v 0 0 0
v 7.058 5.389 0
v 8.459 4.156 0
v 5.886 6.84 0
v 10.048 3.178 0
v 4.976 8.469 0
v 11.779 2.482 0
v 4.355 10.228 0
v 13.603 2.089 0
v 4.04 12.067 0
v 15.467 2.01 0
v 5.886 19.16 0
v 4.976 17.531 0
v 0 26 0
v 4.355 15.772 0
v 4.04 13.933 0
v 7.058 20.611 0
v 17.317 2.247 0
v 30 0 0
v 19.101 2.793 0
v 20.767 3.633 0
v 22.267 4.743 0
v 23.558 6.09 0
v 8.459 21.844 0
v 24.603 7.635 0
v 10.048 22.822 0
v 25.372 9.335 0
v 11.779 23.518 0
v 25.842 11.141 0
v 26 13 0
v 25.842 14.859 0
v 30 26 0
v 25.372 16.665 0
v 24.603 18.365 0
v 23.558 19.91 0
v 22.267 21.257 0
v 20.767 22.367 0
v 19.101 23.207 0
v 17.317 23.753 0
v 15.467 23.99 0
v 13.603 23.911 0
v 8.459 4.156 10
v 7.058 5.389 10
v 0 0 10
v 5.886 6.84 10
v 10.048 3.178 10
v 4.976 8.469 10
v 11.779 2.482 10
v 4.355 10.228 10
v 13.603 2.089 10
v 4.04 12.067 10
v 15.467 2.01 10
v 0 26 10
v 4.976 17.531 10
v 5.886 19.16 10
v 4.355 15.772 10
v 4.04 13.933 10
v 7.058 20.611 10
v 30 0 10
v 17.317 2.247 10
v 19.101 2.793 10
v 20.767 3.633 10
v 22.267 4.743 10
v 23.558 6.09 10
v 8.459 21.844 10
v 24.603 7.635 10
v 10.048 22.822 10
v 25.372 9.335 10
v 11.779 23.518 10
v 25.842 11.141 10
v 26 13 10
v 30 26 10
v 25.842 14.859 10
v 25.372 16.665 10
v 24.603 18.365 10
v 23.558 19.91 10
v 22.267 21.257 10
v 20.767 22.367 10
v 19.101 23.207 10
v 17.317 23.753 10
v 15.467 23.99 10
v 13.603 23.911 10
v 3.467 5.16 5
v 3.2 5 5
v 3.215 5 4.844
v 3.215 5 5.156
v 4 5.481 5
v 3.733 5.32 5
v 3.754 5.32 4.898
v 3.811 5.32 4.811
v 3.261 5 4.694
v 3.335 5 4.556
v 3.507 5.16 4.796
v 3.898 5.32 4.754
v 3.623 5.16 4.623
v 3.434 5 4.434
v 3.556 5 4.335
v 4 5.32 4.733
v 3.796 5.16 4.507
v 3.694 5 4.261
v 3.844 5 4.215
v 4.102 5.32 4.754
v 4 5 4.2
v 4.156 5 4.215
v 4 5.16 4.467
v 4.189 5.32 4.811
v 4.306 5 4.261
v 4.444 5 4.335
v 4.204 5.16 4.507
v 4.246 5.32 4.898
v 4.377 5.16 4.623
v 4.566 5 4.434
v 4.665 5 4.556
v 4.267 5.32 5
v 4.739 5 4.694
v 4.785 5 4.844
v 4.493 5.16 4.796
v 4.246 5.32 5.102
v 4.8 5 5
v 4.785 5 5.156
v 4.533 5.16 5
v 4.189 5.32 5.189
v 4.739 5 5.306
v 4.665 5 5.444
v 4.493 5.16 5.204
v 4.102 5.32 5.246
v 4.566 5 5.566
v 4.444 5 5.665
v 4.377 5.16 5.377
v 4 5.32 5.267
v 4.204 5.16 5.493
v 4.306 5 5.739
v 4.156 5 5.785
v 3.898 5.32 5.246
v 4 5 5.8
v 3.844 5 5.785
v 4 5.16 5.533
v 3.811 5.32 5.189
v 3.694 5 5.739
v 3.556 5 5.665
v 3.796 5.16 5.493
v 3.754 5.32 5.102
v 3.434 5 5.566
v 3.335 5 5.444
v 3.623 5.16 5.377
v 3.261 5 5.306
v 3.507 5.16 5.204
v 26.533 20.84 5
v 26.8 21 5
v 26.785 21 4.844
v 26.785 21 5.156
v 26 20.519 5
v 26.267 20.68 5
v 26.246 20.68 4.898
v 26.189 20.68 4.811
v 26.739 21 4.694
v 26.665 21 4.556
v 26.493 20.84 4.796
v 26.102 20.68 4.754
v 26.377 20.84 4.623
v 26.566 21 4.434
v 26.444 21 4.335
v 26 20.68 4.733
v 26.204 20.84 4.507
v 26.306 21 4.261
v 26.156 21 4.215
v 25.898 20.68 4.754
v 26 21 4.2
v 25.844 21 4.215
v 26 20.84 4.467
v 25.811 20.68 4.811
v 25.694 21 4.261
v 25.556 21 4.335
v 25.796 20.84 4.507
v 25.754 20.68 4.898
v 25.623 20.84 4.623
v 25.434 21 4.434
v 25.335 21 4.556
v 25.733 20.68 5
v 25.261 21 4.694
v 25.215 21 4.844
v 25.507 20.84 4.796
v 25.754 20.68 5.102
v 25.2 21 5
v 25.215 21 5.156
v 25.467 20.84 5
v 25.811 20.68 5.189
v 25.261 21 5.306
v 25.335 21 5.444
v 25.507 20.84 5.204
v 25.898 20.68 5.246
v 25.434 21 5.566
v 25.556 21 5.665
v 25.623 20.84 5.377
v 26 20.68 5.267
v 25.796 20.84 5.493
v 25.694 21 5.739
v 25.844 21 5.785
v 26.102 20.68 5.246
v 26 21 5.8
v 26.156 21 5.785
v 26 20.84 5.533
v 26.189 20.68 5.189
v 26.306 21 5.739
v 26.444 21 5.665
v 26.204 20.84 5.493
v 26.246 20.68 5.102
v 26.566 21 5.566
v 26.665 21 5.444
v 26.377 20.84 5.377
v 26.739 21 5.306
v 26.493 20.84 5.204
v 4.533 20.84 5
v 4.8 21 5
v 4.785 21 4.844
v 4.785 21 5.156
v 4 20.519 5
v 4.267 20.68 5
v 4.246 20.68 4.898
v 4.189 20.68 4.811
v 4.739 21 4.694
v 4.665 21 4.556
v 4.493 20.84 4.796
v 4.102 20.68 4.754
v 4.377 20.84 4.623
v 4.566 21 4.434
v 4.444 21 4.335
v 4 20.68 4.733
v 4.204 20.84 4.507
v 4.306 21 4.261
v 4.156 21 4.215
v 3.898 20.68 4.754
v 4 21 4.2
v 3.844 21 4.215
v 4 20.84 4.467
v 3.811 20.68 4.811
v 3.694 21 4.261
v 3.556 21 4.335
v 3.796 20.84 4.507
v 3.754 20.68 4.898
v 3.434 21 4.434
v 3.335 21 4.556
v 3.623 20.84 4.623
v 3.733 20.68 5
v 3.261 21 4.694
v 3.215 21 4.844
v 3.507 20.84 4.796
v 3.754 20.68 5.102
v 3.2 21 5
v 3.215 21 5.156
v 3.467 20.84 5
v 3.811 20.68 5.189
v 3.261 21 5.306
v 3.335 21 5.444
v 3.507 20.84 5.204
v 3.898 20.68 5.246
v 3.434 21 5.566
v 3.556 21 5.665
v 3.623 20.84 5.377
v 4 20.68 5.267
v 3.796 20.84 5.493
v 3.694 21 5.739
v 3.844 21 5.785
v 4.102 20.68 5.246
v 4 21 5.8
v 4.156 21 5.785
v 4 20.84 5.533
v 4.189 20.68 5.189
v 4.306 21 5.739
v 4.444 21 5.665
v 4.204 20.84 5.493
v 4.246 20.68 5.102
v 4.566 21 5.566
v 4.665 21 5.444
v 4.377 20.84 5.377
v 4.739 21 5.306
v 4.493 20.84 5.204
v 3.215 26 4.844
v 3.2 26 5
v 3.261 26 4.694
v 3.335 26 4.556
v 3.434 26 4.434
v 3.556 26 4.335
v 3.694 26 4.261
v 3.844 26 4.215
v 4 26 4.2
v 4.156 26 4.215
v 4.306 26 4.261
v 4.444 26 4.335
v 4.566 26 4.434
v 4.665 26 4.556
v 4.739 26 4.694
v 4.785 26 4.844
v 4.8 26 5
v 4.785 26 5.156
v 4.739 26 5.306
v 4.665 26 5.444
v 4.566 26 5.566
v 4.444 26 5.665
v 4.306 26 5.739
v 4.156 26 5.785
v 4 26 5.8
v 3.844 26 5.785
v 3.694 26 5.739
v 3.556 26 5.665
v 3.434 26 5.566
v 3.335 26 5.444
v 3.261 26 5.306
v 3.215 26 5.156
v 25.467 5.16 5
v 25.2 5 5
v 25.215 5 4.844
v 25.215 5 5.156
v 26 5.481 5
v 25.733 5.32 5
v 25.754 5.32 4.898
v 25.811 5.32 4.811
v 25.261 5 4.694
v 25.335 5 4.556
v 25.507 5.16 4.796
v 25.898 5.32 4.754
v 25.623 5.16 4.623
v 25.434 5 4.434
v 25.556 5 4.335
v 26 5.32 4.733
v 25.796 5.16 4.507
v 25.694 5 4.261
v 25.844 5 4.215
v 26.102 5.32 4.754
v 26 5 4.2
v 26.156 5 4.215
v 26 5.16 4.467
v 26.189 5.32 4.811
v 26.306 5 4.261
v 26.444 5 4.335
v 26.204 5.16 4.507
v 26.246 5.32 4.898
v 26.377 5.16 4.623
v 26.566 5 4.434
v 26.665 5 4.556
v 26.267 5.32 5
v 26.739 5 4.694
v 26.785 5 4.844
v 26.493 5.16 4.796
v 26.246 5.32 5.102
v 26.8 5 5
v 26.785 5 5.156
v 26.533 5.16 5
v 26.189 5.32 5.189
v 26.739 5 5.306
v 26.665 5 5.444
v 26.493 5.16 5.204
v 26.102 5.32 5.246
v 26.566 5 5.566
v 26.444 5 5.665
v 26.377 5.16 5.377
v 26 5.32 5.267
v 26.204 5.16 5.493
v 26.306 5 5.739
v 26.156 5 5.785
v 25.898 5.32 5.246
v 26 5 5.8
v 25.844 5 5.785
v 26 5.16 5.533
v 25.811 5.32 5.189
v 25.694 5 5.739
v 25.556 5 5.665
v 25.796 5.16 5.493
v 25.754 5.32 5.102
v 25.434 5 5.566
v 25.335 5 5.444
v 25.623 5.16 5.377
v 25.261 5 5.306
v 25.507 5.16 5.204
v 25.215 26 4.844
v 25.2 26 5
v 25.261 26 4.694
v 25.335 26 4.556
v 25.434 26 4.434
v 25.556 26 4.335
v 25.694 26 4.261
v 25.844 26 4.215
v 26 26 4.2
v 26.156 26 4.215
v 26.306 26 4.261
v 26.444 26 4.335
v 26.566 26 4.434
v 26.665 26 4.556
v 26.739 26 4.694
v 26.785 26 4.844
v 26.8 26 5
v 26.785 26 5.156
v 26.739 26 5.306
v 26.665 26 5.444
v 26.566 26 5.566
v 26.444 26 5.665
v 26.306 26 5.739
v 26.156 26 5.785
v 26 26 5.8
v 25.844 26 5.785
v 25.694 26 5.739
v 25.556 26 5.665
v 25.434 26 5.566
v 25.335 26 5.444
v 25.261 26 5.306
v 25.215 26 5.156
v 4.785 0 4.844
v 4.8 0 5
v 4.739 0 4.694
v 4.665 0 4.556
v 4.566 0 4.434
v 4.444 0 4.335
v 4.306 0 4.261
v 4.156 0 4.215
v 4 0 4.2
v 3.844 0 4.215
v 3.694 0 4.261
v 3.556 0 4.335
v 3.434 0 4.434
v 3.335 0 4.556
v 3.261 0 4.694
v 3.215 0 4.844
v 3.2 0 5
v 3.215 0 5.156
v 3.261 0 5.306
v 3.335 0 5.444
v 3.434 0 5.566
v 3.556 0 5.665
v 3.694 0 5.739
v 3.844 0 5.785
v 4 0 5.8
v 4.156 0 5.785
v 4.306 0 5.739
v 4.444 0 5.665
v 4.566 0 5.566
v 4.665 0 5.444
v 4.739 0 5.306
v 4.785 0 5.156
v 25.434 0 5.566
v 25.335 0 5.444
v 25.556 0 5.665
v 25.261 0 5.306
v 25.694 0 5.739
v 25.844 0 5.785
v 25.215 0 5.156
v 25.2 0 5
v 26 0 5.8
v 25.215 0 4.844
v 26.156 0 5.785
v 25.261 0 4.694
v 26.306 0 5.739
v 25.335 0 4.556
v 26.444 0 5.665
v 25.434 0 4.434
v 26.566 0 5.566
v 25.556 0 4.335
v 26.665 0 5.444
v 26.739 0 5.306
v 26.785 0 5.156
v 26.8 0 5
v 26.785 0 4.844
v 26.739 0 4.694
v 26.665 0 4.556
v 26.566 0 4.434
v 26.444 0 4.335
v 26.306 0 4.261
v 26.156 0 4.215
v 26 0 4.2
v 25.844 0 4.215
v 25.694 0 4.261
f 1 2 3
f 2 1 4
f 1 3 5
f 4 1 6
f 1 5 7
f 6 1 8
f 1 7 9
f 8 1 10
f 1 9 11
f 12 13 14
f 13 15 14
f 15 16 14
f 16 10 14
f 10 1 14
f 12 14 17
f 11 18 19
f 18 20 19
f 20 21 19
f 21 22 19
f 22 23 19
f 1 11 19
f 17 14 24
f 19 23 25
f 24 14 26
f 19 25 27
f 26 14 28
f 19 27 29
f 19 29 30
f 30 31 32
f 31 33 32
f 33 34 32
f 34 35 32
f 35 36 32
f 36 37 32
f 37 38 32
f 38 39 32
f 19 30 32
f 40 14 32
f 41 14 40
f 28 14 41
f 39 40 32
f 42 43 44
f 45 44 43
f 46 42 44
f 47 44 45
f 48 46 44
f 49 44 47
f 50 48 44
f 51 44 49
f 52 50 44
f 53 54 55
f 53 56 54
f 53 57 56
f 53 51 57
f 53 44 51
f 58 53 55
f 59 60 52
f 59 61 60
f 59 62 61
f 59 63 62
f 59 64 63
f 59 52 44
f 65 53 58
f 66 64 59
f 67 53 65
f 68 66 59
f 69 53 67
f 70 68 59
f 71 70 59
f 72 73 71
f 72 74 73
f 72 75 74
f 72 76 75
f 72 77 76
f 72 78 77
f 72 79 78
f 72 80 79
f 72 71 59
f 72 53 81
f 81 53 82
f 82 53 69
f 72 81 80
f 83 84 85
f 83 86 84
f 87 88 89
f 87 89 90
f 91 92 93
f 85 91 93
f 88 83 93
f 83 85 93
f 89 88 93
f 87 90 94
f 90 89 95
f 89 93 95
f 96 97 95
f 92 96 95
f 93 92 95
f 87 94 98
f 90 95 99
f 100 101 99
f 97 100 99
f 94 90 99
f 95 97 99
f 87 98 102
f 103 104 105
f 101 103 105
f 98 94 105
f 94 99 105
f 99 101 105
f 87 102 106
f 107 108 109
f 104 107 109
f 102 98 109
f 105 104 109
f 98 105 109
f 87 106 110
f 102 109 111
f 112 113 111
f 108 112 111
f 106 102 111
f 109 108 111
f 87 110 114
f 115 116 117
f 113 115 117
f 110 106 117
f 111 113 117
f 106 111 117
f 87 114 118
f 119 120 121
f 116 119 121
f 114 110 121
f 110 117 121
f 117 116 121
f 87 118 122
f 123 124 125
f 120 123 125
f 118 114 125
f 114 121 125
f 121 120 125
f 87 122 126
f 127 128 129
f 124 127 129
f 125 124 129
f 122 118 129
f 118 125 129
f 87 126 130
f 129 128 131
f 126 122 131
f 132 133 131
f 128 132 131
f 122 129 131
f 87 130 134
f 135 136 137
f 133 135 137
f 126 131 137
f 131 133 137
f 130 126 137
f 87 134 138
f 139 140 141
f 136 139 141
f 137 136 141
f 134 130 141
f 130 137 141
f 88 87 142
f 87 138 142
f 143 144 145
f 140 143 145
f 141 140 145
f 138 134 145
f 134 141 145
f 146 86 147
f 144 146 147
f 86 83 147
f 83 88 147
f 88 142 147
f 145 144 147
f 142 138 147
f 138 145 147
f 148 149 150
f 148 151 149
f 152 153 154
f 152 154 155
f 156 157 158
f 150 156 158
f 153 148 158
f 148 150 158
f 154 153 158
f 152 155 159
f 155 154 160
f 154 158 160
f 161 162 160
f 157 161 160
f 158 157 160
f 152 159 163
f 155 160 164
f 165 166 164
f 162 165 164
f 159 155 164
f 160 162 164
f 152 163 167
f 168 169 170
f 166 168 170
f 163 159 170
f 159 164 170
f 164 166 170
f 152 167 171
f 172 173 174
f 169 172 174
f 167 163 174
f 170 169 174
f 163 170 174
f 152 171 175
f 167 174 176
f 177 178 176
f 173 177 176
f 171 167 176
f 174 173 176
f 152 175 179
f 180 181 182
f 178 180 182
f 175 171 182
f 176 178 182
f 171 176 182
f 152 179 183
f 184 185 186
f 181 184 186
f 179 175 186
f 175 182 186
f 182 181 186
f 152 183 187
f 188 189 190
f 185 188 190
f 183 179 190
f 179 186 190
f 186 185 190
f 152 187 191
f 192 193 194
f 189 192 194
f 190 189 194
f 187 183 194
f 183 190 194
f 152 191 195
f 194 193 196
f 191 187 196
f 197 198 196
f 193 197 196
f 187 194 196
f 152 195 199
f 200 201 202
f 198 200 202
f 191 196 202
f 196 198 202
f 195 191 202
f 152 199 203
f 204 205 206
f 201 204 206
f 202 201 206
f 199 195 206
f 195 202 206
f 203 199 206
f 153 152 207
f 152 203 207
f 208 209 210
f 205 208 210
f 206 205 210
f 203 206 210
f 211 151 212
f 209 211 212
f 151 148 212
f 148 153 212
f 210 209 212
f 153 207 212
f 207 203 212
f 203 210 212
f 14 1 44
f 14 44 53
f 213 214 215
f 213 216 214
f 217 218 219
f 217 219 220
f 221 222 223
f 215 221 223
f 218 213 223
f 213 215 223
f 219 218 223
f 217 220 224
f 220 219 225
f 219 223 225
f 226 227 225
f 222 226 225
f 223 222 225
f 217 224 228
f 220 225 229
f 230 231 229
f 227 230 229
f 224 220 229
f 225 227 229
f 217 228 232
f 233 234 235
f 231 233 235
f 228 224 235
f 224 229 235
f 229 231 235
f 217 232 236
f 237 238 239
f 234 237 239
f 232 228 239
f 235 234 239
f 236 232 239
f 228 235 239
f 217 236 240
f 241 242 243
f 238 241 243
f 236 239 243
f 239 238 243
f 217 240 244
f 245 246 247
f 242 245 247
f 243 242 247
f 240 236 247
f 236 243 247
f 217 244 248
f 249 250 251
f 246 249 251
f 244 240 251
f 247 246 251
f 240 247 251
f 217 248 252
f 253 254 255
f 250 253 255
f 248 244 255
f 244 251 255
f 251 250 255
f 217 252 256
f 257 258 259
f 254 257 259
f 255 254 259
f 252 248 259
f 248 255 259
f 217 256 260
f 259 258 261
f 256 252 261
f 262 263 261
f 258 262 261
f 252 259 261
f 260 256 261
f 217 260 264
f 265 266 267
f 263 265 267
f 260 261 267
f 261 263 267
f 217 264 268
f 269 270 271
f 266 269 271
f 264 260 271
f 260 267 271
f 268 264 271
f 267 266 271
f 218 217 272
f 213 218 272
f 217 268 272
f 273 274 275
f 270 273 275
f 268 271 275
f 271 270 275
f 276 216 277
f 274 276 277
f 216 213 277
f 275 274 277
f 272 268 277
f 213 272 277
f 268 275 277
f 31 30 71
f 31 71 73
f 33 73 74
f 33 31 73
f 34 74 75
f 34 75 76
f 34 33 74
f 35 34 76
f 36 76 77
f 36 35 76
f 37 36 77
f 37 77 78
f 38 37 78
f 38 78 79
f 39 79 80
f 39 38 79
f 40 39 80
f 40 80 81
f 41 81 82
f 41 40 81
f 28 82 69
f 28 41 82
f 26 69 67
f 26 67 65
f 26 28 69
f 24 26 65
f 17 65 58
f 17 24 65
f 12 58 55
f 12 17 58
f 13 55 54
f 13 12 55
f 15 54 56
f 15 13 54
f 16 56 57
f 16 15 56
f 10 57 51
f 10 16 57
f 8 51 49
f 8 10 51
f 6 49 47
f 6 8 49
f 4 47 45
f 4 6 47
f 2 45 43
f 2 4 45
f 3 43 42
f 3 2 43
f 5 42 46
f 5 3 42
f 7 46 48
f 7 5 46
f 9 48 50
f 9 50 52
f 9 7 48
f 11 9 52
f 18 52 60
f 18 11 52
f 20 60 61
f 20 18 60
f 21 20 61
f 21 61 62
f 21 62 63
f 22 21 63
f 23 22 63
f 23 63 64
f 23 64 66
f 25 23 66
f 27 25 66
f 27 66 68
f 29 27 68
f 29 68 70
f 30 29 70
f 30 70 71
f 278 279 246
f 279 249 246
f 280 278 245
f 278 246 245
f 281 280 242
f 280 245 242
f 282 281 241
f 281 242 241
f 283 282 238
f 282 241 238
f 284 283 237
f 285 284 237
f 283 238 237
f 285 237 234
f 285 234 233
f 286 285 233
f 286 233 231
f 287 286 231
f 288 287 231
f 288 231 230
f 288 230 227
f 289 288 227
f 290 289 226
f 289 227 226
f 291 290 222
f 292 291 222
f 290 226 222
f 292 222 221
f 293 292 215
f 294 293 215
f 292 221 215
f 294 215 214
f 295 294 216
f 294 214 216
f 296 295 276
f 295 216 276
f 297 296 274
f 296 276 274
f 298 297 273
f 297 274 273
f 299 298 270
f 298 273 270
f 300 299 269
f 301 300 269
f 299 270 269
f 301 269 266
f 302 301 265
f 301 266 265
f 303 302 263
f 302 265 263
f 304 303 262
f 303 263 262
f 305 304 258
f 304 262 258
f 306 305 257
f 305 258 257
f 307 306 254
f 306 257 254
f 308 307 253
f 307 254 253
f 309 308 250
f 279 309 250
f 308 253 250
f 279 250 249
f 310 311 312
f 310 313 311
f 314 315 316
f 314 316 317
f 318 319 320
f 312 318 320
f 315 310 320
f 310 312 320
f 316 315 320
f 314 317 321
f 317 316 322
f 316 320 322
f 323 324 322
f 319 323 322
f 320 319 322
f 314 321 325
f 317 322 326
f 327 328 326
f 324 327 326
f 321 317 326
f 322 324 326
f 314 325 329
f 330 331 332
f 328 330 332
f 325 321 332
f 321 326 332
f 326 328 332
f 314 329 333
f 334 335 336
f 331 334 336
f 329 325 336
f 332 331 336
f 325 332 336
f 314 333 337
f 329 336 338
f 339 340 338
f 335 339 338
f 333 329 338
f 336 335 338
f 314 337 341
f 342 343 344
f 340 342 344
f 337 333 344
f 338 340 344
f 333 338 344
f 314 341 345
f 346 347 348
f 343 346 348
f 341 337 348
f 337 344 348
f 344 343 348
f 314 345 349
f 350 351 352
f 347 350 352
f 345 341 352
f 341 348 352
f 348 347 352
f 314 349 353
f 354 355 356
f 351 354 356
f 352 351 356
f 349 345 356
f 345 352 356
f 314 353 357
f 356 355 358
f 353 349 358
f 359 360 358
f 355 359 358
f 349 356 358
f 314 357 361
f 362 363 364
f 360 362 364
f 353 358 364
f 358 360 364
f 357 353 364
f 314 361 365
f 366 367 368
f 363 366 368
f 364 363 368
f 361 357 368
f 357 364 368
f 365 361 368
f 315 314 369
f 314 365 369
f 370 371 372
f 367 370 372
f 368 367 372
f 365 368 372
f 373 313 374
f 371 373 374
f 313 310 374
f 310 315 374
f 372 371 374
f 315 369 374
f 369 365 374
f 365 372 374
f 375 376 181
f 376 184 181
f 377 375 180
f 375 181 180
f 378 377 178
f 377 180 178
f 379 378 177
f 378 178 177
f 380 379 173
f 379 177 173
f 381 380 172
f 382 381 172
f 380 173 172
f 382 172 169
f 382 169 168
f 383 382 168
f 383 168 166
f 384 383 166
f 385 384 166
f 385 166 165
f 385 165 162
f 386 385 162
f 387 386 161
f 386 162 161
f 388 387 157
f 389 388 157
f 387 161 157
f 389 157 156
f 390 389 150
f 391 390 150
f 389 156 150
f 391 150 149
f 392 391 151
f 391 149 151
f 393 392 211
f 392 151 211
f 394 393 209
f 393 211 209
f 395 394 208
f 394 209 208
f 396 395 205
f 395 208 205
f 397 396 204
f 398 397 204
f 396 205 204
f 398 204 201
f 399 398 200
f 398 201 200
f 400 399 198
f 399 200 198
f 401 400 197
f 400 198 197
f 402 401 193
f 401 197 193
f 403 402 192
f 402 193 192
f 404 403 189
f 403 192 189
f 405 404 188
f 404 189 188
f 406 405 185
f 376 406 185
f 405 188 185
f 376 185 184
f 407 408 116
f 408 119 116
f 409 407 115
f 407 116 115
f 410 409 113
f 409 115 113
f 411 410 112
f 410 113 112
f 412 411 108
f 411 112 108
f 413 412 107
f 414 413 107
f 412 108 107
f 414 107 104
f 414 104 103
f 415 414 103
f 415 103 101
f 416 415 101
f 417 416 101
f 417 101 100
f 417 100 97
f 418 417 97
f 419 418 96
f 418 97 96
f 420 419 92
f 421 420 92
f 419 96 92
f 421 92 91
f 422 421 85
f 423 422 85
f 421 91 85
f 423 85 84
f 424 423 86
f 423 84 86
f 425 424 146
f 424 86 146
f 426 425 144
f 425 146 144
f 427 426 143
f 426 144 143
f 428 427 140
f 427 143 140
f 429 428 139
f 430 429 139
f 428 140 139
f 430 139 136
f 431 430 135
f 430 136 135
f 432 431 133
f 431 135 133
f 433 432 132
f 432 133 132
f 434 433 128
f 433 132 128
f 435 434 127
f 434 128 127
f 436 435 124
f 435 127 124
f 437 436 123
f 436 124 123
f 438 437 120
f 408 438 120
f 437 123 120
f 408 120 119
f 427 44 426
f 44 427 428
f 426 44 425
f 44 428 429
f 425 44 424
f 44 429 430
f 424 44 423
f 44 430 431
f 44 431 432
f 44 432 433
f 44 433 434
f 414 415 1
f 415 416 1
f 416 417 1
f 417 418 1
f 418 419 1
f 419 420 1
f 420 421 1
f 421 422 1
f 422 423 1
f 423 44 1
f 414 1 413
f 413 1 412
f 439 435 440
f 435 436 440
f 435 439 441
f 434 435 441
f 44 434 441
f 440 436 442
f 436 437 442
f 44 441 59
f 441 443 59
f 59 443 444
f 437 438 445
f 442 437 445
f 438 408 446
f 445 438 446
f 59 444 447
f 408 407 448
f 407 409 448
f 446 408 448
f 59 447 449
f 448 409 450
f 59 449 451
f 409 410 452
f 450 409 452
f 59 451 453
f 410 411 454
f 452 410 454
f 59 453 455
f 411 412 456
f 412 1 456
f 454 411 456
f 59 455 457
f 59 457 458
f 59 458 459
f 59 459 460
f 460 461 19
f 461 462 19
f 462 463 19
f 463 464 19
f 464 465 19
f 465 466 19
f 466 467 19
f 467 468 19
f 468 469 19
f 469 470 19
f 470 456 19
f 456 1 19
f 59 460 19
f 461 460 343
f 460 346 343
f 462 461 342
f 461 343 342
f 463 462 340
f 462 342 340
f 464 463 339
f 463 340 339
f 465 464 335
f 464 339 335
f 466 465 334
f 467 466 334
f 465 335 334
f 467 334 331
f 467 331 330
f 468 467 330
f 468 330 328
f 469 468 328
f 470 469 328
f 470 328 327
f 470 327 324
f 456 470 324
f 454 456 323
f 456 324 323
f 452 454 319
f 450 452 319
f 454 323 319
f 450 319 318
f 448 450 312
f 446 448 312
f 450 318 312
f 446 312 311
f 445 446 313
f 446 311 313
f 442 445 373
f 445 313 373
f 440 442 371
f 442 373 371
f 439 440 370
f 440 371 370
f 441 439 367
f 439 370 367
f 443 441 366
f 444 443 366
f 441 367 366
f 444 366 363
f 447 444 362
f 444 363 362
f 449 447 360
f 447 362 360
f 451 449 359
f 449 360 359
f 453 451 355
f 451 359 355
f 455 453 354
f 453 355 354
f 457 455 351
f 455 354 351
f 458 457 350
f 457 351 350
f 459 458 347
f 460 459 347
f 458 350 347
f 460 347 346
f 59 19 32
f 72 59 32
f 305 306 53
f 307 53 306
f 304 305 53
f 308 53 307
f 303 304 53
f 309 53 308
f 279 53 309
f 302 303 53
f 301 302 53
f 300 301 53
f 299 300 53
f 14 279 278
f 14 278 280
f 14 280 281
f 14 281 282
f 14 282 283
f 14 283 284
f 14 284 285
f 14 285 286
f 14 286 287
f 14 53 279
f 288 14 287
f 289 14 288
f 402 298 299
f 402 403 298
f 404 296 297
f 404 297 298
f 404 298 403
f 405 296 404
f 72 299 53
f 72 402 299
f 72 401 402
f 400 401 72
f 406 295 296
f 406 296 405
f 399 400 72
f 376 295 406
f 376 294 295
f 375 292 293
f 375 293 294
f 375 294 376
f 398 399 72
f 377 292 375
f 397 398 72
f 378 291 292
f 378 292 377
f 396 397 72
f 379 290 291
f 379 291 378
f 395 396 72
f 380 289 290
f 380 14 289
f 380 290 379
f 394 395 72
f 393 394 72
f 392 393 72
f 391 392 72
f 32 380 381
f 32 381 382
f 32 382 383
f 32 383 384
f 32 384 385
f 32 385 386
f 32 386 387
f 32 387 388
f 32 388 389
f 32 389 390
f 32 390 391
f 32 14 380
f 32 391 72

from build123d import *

# Parameters (mm, degrees)
ESQUISSE1_W                                   = 30
ESQUISSE1_H                                   = 26
ESQUISSE1_R                                   = 11
BOSS_EXTRU_1_DEPTH                            = 10
TROU_POUR_TARAUDAGE_POUR_TROU_TARAUD_M2_D     = 1.6
TROU_POUR_TARAUDAGE_POUR_TROU_TARAUD_M2_DEPTH = 5
TROU_POUR_TARAUDAGE_POUR_TROU_TARAUD_M2_TIP   = 0.480688495
TROU_POUR_TARAUDAGE_POUR_TROU_TARAUD_2_D      = 1.6
TROU_POUR_TARAUDAGE_POUR_TROU_TARAUD_2_DEPTH  = 5
TROU_POUR_TARAUDAGE_POUR_TROU_TARAUD_2_TIP    = 0.480688495


with BuildPart() as part:
    # Esquisse1 → Boss.-Extru.1 (new body)
    with BuildSketch(Plane.XY):
        with Locations((15, 13)):
            Rectangle(ESQUISSE1_W, ESQUISSE1_H)
        with Locations((15, 13)):
            Circle(ESQUISSE1_R, mode=Mode.SUBTRACT)
    extrude(amount=BOSS_EXTRU_1_DEPTH)

    # Trou pour taraudage pour trou taraud_ M2
    with Locations(Plane(origin=(0, 26, 0), x_dir=(1, 0, 0), z_dir=(0, 1, 0))):
        with Locations((4, -5), (26, -5)):
            Hole(TROU_POUR_TARAUDAGE_POUR_TROU_TARAUD_M2_D / 2, depth=TROU_POUR_TARAUDAGE_POUR_TROU_TARAUD_M2_DEPTH)
            with Locations((0, 0, -(TROU_POUR_TARAUDAGE_POUR_TROU_TARAUD_M2_DEPTH + TROU_POUR_TARAUDAGE_POUR_TROU_TARAUD_M2_TIP / 2))):  # 118° drill point
                Cone(0, TROU_POUR_TARAUDAGE_POUR_TROU_TARAUD_M2_D / 2, TROU_POUR_TARAUDAGE_POUR_TROU_TARAUD_M2_TIP, mode=Mode.SUBTRACT)

    # Trou pour taraudage pour trou taraud 2
    with Locations(Plane(origin=(0, 0, 0), x_dir=(-1, 0, 0), z_dir=(0, -1, 0))):
        with Locations((-4, -5), (-26, -5)):
            Hole(TROU_POUR_TARAUDAGE_POUR_TROU_TARAUD_2_D / 2, depth=TROU_POUR_TARAUDAGE_POUR_TROU_TARAUD_2_DEPTH)
            with Locations((0, 0, -(TROU_POUR_TARAUDAGE_POUR_TROU_TARAUD_2_DEPTH + TROU_POUR_TARAUDAGE_POUR_TROU_TARAUD_2_TIP / 2))):  # 118° drill point
                Cone(0, TROU_POUR_TARAUDAGE_POUR_TROU_TARAUD_2_D / 2, TROU_POUR_TARAUDAGE_POUR_TROU_TARAUD_2_TIP, mode=Mode.SUBTRACT)


solid = part.part
